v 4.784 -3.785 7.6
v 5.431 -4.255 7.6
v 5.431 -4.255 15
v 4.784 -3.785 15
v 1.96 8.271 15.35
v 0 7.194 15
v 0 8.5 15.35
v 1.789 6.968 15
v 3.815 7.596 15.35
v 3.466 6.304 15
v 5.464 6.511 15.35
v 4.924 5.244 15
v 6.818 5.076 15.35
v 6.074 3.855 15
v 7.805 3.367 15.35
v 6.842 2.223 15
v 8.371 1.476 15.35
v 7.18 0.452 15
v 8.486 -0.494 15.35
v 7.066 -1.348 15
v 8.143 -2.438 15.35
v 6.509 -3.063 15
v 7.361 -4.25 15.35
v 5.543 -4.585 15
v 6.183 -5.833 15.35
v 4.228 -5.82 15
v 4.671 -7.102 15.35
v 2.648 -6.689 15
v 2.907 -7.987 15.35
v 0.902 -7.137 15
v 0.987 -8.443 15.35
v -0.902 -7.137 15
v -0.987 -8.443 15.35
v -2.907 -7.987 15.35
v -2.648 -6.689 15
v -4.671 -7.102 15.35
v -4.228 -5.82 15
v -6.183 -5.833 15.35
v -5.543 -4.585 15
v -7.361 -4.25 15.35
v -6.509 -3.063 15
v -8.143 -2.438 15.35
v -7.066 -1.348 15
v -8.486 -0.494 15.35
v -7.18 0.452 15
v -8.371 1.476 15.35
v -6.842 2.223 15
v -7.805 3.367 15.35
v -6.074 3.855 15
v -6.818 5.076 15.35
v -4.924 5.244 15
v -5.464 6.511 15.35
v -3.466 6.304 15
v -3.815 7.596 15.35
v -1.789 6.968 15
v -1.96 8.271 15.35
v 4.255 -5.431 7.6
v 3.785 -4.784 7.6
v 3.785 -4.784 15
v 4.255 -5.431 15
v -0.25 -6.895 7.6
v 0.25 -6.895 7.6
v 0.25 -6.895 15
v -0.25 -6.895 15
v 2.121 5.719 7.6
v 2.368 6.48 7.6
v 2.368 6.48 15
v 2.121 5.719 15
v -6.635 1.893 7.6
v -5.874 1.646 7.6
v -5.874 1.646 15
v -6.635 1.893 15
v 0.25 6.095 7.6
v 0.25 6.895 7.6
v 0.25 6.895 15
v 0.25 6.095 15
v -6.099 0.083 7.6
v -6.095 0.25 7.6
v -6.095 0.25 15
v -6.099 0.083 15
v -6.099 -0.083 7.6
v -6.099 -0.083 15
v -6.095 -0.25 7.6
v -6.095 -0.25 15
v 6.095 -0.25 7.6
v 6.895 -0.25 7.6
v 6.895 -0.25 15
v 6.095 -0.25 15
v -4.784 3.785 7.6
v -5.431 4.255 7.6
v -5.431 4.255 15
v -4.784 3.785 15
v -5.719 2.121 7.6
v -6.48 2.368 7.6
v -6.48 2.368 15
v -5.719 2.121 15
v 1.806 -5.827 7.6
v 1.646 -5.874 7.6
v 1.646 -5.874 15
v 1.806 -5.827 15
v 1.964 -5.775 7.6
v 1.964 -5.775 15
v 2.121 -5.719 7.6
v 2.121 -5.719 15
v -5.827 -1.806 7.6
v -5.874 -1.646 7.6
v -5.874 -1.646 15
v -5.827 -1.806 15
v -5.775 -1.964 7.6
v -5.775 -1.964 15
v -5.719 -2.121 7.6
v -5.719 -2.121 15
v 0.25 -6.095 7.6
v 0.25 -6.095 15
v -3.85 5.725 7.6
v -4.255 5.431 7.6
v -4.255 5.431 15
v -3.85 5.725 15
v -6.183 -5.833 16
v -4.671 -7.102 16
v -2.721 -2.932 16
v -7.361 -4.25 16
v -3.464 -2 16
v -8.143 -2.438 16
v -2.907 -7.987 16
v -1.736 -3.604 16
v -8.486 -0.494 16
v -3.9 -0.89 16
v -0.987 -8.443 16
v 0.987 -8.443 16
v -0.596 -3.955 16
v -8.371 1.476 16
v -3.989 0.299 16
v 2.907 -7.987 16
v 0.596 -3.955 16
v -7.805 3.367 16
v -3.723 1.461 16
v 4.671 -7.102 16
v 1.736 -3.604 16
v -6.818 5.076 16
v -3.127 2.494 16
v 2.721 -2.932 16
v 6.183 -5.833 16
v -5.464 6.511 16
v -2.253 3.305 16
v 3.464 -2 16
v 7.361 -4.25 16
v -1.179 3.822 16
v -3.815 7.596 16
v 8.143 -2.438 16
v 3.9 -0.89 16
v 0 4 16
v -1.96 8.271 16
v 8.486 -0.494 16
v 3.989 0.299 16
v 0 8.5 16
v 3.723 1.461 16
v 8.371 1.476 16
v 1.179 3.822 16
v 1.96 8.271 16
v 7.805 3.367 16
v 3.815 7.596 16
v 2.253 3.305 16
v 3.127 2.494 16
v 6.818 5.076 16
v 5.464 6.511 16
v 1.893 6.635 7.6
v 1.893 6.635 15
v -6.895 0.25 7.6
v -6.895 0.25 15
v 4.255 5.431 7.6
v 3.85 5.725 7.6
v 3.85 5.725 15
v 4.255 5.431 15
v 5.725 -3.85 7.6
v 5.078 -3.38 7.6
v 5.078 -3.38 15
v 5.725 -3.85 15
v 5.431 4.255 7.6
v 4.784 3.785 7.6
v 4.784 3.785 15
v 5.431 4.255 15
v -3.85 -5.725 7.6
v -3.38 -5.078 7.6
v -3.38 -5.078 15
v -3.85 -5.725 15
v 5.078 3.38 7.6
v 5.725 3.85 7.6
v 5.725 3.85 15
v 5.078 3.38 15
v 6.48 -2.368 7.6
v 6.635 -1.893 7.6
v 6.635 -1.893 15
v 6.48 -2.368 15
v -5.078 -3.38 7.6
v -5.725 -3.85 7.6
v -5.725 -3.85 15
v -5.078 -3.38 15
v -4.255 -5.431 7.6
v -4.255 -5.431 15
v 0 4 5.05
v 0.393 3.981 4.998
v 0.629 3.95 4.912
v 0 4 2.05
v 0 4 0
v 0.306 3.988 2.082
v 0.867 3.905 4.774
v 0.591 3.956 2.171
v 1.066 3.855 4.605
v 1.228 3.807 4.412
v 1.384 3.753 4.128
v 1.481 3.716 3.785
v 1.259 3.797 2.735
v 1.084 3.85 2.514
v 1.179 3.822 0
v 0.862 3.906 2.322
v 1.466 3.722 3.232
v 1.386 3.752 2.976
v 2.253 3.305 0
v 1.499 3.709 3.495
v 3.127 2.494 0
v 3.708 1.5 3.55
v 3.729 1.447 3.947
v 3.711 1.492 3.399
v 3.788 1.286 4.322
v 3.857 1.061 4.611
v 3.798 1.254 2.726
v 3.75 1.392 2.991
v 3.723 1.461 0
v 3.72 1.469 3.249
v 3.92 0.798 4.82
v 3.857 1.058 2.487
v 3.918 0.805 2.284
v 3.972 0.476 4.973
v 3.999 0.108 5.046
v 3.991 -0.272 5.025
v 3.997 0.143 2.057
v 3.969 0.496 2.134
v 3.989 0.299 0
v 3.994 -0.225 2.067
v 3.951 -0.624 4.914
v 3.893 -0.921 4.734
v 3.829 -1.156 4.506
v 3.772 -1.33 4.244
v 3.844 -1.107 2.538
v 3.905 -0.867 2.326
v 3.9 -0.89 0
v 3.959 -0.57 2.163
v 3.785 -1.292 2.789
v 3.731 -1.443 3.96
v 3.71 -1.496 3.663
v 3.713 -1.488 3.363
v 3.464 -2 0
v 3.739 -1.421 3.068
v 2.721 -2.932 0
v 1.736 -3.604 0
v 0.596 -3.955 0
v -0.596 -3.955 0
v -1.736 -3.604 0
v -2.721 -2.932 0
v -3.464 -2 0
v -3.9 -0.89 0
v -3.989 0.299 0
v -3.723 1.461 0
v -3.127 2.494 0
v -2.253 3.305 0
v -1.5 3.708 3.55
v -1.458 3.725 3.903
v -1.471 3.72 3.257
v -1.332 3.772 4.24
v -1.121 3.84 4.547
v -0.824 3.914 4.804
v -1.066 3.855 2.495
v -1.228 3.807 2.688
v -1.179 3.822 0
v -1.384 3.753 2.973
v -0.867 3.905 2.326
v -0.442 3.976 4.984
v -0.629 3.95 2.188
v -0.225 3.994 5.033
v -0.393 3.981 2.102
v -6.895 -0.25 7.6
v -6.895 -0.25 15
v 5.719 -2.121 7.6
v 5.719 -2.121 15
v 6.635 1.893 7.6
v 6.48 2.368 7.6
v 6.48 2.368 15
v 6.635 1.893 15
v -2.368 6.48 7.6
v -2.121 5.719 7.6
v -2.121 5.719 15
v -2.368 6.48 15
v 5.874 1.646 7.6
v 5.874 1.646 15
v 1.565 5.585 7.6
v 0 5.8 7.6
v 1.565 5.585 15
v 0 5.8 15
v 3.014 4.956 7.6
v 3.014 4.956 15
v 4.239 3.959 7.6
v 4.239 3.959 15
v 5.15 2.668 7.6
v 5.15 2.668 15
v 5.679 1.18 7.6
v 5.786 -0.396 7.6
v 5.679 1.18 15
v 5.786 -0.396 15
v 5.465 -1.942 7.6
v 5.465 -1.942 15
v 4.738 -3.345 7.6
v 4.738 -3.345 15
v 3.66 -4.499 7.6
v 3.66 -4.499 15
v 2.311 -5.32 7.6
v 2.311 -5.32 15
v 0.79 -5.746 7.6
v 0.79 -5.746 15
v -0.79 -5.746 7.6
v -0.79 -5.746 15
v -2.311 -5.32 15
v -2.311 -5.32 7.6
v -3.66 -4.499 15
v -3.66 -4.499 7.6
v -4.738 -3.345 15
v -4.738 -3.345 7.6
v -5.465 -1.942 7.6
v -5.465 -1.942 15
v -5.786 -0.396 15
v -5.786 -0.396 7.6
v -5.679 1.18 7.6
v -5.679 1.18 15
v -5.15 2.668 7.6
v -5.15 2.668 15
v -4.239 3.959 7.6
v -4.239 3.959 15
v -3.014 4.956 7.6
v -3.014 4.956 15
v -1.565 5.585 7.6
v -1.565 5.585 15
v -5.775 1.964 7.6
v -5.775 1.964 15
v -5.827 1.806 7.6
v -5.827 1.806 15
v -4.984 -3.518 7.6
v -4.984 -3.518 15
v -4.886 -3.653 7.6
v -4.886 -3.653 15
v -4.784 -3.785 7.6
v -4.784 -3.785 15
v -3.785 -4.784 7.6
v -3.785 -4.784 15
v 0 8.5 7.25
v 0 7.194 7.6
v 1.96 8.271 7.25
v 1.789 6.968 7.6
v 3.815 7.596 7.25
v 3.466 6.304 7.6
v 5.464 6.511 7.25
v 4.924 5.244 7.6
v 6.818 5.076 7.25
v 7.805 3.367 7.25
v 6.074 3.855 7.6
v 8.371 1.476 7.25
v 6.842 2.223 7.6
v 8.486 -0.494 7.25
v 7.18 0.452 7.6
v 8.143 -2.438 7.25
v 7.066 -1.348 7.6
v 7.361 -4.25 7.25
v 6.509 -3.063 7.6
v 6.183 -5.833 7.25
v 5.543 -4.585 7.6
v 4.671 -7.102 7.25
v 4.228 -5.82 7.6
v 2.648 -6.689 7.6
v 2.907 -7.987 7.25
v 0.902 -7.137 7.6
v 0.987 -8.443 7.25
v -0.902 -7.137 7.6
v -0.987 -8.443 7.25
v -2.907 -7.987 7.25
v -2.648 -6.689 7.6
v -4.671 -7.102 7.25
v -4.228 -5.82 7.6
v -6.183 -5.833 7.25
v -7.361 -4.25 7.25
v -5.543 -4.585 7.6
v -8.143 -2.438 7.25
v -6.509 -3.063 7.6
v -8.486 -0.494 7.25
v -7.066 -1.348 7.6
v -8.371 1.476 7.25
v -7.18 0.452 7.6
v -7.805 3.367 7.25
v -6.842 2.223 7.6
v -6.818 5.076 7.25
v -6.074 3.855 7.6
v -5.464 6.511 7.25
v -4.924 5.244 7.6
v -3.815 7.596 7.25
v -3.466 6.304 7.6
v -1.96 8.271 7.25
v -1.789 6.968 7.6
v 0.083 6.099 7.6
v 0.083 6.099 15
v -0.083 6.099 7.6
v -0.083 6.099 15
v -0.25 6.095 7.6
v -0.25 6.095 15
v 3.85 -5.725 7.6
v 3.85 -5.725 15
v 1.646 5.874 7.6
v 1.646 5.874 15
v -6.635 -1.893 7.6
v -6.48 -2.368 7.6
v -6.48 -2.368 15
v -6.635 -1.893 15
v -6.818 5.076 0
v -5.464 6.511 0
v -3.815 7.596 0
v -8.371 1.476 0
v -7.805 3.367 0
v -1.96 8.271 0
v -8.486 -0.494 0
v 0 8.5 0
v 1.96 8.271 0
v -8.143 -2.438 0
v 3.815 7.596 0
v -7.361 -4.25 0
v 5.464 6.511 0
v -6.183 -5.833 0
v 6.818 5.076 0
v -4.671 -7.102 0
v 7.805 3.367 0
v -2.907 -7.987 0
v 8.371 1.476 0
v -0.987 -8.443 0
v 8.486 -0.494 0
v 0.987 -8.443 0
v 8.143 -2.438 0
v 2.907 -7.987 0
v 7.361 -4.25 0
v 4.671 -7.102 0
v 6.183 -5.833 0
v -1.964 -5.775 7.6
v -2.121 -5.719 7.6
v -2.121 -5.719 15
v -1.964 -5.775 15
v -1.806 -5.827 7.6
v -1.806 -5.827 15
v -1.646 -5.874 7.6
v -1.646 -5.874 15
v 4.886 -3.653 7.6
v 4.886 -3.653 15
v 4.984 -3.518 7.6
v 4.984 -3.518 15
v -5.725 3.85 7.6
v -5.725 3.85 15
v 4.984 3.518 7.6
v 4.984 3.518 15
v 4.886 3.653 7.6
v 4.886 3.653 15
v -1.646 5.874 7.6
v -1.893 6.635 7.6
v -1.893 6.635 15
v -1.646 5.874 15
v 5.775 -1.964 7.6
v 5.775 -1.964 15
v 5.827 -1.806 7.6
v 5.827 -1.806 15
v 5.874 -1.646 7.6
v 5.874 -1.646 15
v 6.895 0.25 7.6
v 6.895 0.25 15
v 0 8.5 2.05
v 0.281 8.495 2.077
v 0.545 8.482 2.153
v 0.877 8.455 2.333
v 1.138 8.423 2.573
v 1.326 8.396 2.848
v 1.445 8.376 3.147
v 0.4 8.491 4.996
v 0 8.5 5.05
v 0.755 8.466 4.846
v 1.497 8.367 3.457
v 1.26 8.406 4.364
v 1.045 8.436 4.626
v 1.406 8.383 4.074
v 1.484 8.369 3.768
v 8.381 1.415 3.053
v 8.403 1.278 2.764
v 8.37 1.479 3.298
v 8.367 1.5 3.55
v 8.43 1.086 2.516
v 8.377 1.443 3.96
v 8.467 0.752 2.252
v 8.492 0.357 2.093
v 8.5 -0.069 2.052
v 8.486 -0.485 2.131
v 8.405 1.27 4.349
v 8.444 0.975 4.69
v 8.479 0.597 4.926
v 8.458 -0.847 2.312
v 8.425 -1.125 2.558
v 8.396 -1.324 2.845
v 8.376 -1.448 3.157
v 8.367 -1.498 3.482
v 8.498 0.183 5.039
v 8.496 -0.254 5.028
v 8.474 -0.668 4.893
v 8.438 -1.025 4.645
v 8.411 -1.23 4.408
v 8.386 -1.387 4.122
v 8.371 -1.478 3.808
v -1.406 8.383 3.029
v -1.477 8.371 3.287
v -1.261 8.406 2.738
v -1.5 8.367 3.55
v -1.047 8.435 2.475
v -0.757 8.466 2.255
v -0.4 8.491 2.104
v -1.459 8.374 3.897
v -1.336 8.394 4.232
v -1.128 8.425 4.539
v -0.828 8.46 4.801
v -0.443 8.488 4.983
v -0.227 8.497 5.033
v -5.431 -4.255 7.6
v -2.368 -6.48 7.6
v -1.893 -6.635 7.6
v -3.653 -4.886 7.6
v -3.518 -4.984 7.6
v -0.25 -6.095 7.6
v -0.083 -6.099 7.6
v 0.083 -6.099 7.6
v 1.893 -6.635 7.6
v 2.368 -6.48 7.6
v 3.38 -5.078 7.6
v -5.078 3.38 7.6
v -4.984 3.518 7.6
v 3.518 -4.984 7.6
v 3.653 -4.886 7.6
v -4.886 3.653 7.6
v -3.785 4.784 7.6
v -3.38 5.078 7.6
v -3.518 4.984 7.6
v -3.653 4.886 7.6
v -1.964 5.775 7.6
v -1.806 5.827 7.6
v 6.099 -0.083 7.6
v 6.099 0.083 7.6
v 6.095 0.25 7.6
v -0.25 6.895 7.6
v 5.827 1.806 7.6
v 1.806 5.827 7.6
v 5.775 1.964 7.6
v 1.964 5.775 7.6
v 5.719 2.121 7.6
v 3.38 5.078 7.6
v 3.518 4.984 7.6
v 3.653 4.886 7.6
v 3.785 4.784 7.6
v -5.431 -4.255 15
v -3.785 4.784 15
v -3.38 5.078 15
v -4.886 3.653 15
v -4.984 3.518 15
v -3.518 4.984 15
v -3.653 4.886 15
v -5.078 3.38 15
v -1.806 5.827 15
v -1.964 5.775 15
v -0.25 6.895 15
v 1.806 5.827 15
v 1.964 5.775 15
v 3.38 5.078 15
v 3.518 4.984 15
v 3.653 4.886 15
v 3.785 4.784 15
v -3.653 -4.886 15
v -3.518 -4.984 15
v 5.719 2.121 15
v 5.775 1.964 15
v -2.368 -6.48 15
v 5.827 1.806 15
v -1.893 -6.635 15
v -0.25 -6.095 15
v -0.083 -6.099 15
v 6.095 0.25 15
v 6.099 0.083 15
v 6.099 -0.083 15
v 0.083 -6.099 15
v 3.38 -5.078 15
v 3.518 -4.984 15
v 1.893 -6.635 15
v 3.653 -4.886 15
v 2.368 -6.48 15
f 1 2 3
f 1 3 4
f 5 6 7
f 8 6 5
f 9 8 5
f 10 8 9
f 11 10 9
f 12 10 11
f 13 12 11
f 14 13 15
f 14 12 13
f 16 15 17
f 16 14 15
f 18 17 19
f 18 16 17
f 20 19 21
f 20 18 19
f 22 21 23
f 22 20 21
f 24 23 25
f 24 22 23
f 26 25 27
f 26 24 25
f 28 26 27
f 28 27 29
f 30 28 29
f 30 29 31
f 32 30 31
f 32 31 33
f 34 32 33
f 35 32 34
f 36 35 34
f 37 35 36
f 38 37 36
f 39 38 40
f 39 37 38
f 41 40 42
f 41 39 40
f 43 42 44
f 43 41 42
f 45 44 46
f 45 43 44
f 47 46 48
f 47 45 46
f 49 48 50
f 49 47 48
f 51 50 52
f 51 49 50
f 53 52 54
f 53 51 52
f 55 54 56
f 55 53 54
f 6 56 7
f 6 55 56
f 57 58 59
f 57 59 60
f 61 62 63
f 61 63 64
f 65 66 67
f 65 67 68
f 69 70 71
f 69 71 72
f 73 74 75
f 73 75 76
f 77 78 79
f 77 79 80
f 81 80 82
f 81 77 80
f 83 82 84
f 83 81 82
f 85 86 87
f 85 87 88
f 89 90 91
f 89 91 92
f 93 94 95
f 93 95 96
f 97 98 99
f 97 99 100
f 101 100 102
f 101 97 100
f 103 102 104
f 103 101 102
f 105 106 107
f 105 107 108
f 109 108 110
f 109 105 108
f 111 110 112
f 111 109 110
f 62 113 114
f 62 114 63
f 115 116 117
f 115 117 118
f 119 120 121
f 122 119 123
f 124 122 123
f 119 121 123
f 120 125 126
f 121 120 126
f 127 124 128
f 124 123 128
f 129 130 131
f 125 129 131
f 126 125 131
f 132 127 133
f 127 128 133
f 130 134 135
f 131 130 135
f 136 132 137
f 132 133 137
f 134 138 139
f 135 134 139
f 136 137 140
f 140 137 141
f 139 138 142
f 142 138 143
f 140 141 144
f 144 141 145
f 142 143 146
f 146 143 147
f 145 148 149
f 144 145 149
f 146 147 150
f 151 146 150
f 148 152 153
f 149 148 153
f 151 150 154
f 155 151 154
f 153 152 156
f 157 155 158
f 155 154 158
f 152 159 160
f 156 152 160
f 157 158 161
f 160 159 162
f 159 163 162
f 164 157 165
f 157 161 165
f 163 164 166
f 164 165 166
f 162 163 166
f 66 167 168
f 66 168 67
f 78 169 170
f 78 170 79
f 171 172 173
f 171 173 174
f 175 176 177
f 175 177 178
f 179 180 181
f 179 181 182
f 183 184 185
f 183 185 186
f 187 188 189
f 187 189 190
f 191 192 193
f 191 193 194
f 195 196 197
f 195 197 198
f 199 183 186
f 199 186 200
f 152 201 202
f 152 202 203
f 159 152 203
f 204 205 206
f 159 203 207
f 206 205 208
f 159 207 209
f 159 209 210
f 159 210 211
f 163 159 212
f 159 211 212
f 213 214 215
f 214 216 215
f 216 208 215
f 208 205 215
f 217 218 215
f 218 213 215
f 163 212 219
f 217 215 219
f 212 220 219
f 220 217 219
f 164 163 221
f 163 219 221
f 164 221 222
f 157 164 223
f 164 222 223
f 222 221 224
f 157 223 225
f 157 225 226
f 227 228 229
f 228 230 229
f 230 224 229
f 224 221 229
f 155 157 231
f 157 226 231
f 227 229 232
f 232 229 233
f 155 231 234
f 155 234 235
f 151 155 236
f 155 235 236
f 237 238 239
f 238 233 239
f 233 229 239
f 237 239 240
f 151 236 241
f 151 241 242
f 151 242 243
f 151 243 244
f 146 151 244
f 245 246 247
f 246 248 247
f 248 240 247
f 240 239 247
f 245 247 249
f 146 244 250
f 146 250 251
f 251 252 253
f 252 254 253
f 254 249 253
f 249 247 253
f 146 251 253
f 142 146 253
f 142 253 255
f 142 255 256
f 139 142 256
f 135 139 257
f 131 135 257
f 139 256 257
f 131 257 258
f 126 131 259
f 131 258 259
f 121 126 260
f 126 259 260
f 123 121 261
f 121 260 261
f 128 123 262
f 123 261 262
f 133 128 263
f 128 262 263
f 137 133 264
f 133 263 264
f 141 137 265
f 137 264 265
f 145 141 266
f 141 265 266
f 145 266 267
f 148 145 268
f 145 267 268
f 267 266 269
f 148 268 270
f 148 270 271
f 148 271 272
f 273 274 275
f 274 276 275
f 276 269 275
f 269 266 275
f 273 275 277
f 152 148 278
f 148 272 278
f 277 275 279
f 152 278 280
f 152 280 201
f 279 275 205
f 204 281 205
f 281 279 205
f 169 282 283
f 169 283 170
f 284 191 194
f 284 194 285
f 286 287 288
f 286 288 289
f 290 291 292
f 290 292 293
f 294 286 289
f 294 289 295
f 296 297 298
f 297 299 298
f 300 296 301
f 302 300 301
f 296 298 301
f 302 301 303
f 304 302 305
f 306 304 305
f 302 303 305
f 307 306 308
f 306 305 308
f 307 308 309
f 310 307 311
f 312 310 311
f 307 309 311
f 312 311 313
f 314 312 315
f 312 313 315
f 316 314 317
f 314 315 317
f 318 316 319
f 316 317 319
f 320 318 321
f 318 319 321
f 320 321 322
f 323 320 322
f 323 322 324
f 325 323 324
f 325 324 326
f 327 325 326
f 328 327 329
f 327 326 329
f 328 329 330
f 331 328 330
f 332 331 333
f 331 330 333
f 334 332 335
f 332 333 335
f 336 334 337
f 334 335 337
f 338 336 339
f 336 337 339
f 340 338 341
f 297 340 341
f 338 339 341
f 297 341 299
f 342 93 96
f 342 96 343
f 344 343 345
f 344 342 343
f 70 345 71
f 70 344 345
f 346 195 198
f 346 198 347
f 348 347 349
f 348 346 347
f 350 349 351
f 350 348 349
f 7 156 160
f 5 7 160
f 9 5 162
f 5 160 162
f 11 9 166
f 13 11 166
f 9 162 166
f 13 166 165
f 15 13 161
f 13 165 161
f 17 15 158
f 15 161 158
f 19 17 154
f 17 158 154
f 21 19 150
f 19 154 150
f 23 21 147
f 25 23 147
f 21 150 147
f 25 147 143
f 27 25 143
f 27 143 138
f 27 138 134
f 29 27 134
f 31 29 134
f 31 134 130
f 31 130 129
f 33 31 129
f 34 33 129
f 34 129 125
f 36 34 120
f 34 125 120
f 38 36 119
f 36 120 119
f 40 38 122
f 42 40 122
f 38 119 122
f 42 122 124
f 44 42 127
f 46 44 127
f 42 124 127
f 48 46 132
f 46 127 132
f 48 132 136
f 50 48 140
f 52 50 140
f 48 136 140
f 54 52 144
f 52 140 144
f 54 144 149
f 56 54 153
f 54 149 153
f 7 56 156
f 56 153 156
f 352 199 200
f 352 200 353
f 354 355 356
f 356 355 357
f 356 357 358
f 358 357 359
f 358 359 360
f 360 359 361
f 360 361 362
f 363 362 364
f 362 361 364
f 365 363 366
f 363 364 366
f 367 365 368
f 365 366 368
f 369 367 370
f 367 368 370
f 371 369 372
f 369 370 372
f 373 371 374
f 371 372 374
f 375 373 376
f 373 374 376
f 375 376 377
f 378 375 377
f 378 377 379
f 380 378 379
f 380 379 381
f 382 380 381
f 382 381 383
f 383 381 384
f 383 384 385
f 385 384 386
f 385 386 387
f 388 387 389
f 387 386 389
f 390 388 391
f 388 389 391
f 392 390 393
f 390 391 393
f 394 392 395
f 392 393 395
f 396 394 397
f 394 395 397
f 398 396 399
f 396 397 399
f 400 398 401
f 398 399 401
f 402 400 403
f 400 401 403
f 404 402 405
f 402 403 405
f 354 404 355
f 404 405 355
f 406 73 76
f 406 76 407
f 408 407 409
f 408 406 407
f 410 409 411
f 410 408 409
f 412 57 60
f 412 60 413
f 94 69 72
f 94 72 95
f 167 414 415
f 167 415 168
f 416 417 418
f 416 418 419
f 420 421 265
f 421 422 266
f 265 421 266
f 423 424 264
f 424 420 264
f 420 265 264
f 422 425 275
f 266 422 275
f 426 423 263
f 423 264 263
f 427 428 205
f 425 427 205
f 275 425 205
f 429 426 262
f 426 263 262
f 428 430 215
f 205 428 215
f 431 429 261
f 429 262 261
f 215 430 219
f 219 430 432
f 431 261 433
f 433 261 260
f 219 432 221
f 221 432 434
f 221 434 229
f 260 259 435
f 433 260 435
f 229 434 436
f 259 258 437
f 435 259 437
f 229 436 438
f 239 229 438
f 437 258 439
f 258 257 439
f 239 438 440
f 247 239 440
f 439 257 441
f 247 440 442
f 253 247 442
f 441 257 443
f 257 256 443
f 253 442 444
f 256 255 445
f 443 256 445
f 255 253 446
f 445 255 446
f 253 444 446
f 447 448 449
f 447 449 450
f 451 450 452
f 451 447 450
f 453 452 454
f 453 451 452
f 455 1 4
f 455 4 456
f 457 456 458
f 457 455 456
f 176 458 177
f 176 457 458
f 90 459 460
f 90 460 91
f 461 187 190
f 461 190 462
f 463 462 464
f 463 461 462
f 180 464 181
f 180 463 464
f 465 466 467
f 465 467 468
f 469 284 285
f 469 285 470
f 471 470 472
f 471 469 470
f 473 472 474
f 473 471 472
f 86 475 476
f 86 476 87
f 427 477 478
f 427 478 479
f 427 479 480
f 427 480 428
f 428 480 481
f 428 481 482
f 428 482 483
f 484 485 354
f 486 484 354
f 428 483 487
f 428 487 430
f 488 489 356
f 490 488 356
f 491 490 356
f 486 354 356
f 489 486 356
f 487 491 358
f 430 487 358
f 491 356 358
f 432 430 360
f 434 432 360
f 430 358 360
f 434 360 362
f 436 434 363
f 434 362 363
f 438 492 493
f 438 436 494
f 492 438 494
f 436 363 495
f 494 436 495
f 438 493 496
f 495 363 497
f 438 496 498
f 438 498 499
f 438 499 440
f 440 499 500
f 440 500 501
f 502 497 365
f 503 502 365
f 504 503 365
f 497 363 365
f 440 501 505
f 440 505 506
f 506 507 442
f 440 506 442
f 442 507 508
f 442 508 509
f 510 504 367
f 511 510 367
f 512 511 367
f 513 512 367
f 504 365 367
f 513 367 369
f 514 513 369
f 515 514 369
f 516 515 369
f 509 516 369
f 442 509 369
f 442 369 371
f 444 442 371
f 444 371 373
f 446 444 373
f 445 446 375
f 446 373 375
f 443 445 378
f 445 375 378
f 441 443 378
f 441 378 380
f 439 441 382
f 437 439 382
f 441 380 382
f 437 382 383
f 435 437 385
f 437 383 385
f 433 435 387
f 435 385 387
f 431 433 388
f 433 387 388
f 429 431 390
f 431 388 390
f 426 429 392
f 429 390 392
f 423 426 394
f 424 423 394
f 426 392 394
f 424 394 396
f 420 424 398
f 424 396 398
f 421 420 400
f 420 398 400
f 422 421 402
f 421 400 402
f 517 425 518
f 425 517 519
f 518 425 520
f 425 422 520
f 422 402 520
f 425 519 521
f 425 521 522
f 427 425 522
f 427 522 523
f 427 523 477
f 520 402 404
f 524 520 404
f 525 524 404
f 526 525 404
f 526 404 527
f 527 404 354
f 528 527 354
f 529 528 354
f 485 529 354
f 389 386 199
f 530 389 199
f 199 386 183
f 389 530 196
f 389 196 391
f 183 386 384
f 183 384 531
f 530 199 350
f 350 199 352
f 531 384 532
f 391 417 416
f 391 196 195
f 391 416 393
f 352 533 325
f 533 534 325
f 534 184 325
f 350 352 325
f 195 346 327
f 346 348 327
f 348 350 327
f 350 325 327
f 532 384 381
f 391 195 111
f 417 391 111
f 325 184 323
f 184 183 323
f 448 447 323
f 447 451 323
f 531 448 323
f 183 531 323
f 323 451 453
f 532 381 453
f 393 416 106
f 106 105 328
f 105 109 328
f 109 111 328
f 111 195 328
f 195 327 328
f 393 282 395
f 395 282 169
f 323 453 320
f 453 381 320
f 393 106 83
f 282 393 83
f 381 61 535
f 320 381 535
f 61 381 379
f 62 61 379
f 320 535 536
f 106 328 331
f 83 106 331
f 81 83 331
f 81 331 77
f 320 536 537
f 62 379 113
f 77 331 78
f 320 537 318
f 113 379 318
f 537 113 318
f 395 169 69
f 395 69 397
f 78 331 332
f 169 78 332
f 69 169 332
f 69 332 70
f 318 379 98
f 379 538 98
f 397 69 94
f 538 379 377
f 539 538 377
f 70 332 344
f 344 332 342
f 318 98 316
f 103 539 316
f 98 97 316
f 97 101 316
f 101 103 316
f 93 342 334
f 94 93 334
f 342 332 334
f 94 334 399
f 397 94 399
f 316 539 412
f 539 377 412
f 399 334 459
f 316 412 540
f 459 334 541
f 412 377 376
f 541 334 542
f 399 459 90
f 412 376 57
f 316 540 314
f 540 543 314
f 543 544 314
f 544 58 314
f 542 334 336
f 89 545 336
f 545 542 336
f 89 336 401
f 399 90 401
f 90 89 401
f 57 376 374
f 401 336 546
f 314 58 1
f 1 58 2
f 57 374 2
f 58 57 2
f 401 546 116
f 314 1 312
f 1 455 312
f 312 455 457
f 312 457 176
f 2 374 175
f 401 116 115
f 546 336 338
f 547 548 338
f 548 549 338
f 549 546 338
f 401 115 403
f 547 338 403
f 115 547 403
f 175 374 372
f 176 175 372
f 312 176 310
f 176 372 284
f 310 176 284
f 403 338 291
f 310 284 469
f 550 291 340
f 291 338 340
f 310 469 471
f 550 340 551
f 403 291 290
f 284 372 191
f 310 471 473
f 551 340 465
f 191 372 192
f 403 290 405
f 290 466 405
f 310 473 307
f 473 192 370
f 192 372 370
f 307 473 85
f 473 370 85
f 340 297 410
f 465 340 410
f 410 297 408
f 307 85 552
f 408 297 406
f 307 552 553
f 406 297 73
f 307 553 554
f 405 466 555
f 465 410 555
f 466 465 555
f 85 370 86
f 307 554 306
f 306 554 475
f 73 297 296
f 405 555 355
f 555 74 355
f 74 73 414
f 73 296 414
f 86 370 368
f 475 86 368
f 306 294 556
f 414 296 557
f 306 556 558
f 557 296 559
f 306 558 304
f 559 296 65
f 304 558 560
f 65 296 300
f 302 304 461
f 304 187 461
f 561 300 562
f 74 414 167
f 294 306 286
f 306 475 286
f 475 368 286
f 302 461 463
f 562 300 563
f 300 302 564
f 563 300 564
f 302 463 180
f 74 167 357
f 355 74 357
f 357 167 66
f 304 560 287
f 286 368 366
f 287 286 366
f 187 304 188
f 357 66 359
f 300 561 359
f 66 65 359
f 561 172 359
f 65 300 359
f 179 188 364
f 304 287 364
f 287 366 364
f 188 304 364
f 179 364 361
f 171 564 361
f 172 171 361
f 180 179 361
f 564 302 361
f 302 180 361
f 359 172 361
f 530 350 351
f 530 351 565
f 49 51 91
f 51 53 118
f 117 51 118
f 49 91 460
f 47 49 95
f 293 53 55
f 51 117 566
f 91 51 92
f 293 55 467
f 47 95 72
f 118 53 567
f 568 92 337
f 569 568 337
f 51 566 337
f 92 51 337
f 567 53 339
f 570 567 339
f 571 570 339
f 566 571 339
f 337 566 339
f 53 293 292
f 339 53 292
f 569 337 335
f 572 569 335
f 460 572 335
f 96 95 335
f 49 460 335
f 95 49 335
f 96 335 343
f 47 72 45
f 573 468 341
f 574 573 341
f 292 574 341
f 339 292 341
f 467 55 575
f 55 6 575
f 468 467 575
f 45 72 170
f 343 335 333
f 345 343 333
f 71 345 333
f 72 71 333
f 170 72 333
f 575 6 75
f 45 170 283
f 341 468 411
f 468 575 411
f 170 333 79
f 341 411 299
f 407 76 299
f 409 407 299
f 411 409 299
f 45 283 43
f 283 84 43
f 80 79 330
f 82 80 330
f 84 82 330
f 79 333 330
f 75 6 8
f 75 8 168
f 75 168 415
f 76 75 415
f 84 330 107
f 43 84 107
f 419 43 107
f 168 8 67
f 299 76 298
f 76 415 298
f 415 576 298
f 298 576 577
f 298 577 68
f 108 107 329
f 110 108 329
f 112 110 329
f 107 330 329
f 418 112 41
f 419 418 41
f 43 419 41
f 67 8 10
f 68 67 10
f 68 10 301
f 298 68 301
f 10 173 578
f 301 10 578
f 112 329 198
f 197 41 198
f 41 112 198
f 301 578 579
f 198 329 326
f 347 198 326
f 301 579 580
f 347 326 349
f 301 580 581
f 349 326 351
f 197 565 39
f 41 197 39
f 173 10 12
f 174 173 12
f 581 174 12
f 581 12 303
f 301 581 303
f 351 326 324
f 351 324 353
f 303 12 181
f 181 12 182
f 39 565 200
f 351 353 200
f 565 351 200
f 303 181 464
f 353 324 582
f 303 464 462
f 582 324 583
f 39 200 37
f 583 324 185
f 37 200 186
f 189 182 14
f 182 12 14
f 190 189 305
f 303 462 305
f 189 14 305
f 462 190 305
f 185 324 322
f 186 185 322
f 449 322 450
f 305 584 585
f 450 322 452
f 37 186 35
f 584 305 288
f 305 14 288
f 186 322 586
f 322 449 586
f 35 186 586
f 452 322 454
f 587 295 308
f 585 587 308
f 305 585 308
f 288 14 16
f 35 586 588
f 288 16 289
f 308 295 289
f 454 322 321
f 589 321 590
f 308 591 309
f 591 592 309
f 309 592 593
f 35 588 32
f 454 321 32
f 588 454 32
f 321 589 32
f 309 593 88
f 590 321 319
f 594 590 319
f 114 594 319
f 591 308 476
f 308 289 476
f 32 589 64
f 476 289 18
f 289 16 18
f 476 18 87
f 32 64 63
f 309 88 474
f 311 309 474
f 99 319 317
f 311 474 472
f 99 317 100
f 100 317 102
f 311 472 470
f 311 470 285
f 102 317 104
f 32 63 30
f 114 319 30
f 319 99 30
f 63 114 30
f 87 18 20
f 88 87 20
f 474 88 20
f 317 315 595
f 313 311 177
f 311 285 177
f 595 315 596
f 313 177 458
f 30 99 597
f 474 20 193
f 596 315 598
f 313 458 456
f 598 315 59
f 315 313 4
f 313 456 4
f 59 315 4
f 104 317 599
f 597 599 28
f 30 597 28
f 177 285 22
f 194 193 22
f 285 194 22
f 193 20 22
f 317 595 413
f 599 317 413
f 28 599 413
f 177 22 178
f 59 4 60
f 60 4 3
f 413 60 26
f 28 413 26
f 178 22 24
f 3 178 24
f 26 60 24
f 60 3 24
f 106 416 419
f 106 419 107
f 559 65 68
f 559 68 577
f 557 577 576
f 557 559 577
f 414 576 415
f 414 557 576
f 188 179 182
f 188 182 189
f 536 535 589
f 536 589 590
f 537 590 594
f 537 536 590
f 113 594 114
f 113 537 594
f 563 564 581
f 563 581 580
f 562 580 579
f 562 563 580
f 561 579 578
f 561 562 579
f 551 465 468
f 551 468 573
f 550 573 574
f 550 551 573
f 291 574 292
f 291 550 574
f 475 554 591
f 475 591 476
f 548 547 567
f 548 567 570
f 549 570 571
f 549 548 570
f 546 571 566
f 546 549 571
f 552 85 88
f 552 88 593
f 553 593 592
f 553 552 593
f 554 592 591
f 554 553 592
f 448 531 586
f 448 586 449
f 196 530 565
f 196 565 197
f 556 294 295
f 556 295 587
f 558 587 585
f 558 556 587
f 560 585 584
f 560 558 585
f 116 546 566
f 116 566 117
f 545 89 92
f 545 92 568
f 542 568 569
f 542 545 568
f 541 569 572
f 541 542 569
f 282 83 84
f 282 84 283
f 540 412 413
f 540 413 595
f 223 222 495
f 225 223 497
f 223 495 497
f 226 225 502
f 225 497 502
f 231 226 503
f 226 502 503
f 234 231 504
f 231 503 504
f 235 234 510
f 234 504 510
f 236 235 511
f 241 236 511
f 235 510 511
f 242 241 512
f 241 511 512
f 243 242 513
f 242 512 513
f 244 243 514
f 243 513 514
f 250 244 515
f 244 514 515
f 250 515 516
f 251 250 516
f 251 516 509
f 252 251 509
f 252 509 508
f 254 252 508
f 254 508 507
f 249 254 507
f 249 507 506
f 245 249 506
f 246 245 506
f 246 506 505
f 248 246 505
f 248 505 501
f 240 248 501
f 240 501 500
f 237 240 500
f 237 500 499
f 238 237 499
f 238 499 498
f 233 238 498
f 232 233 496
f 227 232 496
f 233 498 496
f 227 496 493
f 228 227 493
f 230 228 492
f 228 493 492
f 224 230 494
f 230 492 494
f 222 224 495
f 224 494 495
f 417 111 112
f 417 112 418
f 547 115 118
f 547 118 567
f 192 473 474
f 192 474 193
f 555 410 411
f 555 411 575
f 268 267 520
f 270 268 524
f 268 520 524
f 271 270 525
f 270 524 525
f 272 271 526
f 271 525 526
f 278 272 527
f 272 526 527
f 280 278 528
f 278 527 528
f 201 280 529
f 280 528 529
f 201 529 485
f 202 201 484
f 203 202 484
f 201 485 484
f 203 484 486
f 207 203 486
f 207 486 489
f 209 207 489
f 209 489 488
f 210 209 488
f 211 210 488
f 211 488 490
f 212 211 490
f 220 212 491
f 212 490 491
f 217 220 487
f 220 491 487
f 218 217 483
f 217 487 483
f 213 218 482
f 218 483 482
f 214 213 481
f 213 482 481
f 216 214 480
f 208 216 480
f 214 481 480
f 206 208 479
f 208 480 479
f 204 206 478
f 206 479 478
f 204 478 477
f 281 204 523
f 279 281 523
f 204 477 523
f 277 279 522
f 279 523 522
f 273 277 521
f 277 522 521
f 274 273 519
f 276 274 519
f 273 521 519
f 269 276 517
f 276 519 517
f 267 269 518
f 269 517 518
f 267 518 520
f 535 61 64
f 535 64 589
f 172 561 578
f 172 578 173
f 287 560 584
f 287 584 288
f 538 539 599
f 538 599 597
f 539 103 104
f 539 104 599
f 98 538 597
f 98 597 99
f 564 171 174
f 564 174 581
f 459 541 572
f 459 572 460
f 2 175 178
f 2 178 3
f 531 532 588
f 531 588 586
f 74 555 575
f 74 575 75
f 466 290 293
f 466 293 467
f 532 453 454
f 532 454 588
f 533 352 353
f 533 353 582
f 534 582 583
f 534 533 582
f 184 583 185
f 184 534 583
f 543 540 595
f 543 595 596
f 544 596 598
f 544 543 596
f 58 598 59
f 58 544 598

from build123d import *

# Parameters (mm, degrees)
CHAMFER1_SIZE       = 0.35
CHAMFER1_SIZE2      = 1.306217783
CHAMFER2_SIZE       = 0.35
CHAMFER2_SIZE2      = 1.306217783
BOSS_EXTRUDE1_DEPTH = 7.4
SKETCH6_R           = 1.5
CUT_EXTRUDE1_DEPTH  = 10
CIRPATTERN1_COUNT   = 2
CIRPATTERN1_ANGLE   = 270


with BuildPart() as part:
    # Sketch2 → Revolve1 (revolve)
    with BuildSketch(Plane(origin=(0, 0, 0), x_dir=(0, 0, -1), z_dir=(1, 0, 0))):
        Polygon((-16, 4), (0, 4), (0, 8.5), (-7.6, 8.5), (-7.6, 5.8), (-15, 5.8), (-15, 8.5), (-16, 8.5), align=None)
    revolve(axis=Axis((0, 0, 79.609460318), (0, 0, -1)))

    # Chamfer1
    chamfer1_edges = [part.edges().sort_by_distance(p)[0] for p in [
        (0, -8.5, 15),
    ]]
    chamfer1_side = [part.faces().sort_by_distance(p)[0] for p in [
        (0, -8.5, 15.5),
    ]]
    chamfer(chamfer1_edges, length=CHAMFER1_SIZE, length2=CHAMFER1_SIZE2, reference=chamfer1_side[0])

    # Chamfer2
    chamfer2_edges = [part.edges().sort_by_distance(p)[0] for p in [
        (0, -8.5, 7.6),
    ]]
    chamfer2_side = [part.faces().sort_by_distance(p)[0] for p in [
        (0, -8.5, 3.8),
    ]]
    chamfer(chamfer2_edges, length=CHAMFER2_SIZE, length2=CHAMFER2_SIZE2, reference=chamfer2_side[0])

    # Sketch4 → Boss-Extrude1 (add)
    with BuildSketch(Plane.XY.offset(7.6)):
        with BuildLine():
            Line((1.645655792, 5.873824735), (1.892869388, 6.634669948))
            Line((1.892869388, 6.634669948), (2.368397646, 6.48016145))
            Line((2.368397646, 6.48016145), (2.121184051, 5.719316237))
            ThreePointArc((2.121184051, 5.719316237), (1.885003666, 5.801444749), (1.645655792, 5.873824735))
        make_face()
        with BuildLine():
            Line((-0.25, 6.094874896), (-0.25, 6.894874896))
            Line((-0.25, 6.894874896), (0.25, 6.894874896))
            Line((0.25, 6.894874896), (0.25, 6.094874896))
            ThreePointArc((0.25, 6.094874896), (0, 6.1), (-0.25, 6.094874896))
        make_face()
        with BuildLine():
            Line((3.38022333, 5.077803683), (3.850451532, 5.725017278))
            Line((3.850451532, 5.725017278), (4.254960029, 5.431124652))
            Line((4.254960029, 5.431124652), (3.784731827, 4.783911057))
            ThreePointArc((3.784731827, 4.783911057), (3.585490039, 4.935003666), (3.38022333, 5.077803683))
        make_face()
        with BuildLine():
            Line((4.783911057, 3.784731827), (5.431124652, 4.254960029))
            Line((5.431124652, 4.254960029), (5.725017278, 3.850451532))
            Line((5.725017278, 3.850451532), (5.077803683, 3.38022333))
            ThreePointArc((5.077803683, 3.38022333), (4.935003666, 3.585490039), (4.783911057, 3.784731827))
        make_face()
        with BuildLine():
            Line((5.719316237, 2.121184051), (6.48016145, 2.368397646))
            Line((6.48016145, 2.368397646), (6.634669948, 1.892869388))
            Line((6.634669948, 1.892869388), (5.873824735, 1.645655792))
            ThreePointArc((5.873824735, 1.645655792), (5.801444749, 1.885003666), (5.719316237, 2.121184051))
        make_face()
        with BuildLine():
            Line((6.094874896, 0.25), (6.894874896, 0.25))
            Line((6.894874896, 0.25), (6.894874896, -0.25))
            Line((6.894874896, -0.25), (6.094874896, -0.25))
            ThreePointArc((6.094874896, -0.25), (6.1, 0), (6.094874896, 0.25))
        make_face()
        with BuildLine():
            Line((5.873824735, -1.645655792), (6.634669948, -1.892869388))
            Line((6.634669948, -1.892869388), (6.48016145, -2.368397646))
            Line((6.48016145, -2.368397646), (5.719316237, -2.121184051))
            ThreePointArc((5.719316237, -2.121184051), (5.801444749, -1.885003666), (5.873824735, -1.645655792))
        make_face()
        with BuildLine():
            Line((5.077803683, -3.38022333), (5.725017278, -3.850451532))
            Line((5.725017278, -3.850451532), (5.431124652, -4.254960029))
            Line((5.431124652, -4.254960029), (4.783911057, -3.784731827))
            ThreePointArc((4.783911057, -3.784731827), (4.935003666, -3.585490039), (5.077803683, -3.38022333))
        make_face()
        with BuildLine():
            Line((3.784731827, -4.783911057), (4.254960029, -5.431124652))
            Line((4.254960029, -5.431124652), (3.850451532, -5.725017278))
            Line((3.850451532, -5.725017278), (3.38022333, -5.077803683))
            ThreePointArc((3.38022333, -5.077803683), (3.585490039, -4.935003666), (3.784731827, -4.783911057))
        make_face()
        with BuildLine():
            Line((2.121184051, -5.719316237), (2.368397646, -6.48016145))
            Line((2.368397646, -6.48016145), (1.892869388, -6.634669948))
            Line((1.892869388, -6.634669948), (1.645655792, -5.873824735))
            ThreePointArc((1.645655792, -5.873824735), (1.885003666, -5.801444749), (2.121184051, -5.719316237))
        make_face()
        with BuildLine():
            Line((0.25, -6.094874896), (0.25, -6.894874896))
            Line((0.25, -6.894874896), (-0.25, -6.894874896))
            Line((-0.25, -6.894874896), (-0.25, -6.094874896))
            ThreePointArc((-0.25, -6.094874896), (0, -6.1), (0.25, -6.094874896))
        make_face()
        with BuildLine():
            Line((-1.645655792, -5.873824735), (-1.892869388, -6.634669948))
            Line((-1.892869388, -6.634669948), (-2.368397646, -6.48016145))
            Line((-2.368397646, -6.48016145), (-2.121184051, -5.719316237))
            ThreePointArc((-2.121184051, -5.719316237), (-1.885003666, -5.801444749), (-1.645655792, -5.873824735))
        make_face()
        with BuildLine():
            Line((-3.38022333, -5.077803683), (-3.850451532, -5.725017278))
            Line((-3.850451532, -5.725017278), (-4.254960029, -5.431124652))
            Line((-4.254960029, -5.431124652), (-3.784731827, -4.783911057))
            ThreePointArc((-3.784731827, -4.783911057), (-3.585490039, -4.935003666), (-3.38022333, -5.077803683))
        make_face()
        with BuildLine():
            Line((-4.783911057, -3.784731827), (-5.431124652, -4.254960029))
            Line((-5.431124652, -4.254960029), (-5.725017278, -3.850451532))
            Line((-5.725017278, -3.850451532), (-5.077803683, -3.38022333))
            ThreePointArc((-5.077803683, -3.38022333), (-4.935003666, -3.585490039), (-4.783911057, -3.784731827))
        make_face()
        with BuildLine():
            Line((-5.719316237, -2.121184051), (-6.48016145, -2.368397646))
            Line((-6.48016145, -2.368397646), (-6.634669948, -1.892869388))
            Line((-6.634669948, -1.892869388), (-5.873824735, -1.645655792))
            ThreePointArc((-5.873824735, -1.645655792), (-5.801444749, -1.885003666), (-5.719316237, -2.121184051))
        make_face()
        with BuildLine():
            Line((-6.094874896, -0.25), (-6.894874896, -0.25))
            Line((-6.894874896, -0.25), (-6.894874896, 0.25))
            Line((-6.894874896, 0.25), (-6.094874896, 0.25))
            ThreePointArc((-6.094874896, 0.25), (-6.1, 0), (-6.094874896, -0.25))
        make_face()
        with BuildLine():
            Line((-5.873824735, 1.645655792), (-6.634669948, 1.892869388))
            Line((-6.634669948, 1.892869388), (-6.48016145, 2.368397646))
            Line((-6.48016145, 2.368397646), (-5.719316237, 2.121184051))
            ThreePointArc((-5.719316237, 2.121184051), (-5.801444749, 1.885003666), (-5.873824735, 1.645655792))
        make_face()
        with BuildLine():
            Line((-5.077803683, 3.38022333), (-5.725017278, 3.850451532))
            Line((-5.725017278, 3.850451532), (-5.431124652, 4.254960029))
            Line((-5.431124652, 4.254960029), (-4.783911057, 3.784731827))
            ThreePointArc((-4.783911057, 3.784731827), (-4.935003666, 3.585490039), (-5.077803683, 3.38022333))
        make_face()
        with BuildLine():
            Line((-3.784731827, 4.783911057), (-4.254960029, 5.431124652))
            Line((-4.254960029, 5.431124652), (-3.850451532, 5.725017278))
            Line((-3.850451532, 5.725017278), (-3.38022333, 5.077803683))
            ThreePointArc((-3.38022333, 5.077803683), (-3.585490039, 4.935003666), (-3.784731827, 4.783911057))
        make_face()
        with BuildLine():
            Line((-2.121184051, 5.719316237), (-2.368397646, 6.48016145))
            Line((-2.368397646, 6.48016145), (-1.892869388, 6.634669948))
            Line((-1.892869388, 6.634669948), (-1.645655792, 5.873824735))
            ThreePointArc((-1.645655792, 5.873824735), (-1.885003666, 5.801444749), (-2.121184051, 5.719316237))
        make_face()
    extrude(amount=BOSS_EXTRUDE1_DEPTH)

    # Sketch6 → Cut-Extrude1 (cut)
    with BuildSketch(Plane(origin=(0, 8.9, 0), x_dir=(-1, 0, 0), z_dir=(0, 1, 0))):
        with Locations((0, 3.55)):
            Circle(SKETCH6_R)
    cut_extrude1 = extrude(amount=-CUT_EXTRUDE1_DEPTH, mode=Mode.SUBTRACT)

    # CirPattern1: Cut-Extrude1 ×2 about axis
    cirpattern1_axis = Axis((0, 0, 0), (0, 0, 1))
    for i in range(1, CIRPATTERN1_COUNT):
        add(cut_extrude1.rotate(cirpattern1_axis, i * CIRPATTERN1_ANGLE / (CIRPATTERN1_COUNT - 1)), mode=Mode.SUBTRACT)


solid = part.part
